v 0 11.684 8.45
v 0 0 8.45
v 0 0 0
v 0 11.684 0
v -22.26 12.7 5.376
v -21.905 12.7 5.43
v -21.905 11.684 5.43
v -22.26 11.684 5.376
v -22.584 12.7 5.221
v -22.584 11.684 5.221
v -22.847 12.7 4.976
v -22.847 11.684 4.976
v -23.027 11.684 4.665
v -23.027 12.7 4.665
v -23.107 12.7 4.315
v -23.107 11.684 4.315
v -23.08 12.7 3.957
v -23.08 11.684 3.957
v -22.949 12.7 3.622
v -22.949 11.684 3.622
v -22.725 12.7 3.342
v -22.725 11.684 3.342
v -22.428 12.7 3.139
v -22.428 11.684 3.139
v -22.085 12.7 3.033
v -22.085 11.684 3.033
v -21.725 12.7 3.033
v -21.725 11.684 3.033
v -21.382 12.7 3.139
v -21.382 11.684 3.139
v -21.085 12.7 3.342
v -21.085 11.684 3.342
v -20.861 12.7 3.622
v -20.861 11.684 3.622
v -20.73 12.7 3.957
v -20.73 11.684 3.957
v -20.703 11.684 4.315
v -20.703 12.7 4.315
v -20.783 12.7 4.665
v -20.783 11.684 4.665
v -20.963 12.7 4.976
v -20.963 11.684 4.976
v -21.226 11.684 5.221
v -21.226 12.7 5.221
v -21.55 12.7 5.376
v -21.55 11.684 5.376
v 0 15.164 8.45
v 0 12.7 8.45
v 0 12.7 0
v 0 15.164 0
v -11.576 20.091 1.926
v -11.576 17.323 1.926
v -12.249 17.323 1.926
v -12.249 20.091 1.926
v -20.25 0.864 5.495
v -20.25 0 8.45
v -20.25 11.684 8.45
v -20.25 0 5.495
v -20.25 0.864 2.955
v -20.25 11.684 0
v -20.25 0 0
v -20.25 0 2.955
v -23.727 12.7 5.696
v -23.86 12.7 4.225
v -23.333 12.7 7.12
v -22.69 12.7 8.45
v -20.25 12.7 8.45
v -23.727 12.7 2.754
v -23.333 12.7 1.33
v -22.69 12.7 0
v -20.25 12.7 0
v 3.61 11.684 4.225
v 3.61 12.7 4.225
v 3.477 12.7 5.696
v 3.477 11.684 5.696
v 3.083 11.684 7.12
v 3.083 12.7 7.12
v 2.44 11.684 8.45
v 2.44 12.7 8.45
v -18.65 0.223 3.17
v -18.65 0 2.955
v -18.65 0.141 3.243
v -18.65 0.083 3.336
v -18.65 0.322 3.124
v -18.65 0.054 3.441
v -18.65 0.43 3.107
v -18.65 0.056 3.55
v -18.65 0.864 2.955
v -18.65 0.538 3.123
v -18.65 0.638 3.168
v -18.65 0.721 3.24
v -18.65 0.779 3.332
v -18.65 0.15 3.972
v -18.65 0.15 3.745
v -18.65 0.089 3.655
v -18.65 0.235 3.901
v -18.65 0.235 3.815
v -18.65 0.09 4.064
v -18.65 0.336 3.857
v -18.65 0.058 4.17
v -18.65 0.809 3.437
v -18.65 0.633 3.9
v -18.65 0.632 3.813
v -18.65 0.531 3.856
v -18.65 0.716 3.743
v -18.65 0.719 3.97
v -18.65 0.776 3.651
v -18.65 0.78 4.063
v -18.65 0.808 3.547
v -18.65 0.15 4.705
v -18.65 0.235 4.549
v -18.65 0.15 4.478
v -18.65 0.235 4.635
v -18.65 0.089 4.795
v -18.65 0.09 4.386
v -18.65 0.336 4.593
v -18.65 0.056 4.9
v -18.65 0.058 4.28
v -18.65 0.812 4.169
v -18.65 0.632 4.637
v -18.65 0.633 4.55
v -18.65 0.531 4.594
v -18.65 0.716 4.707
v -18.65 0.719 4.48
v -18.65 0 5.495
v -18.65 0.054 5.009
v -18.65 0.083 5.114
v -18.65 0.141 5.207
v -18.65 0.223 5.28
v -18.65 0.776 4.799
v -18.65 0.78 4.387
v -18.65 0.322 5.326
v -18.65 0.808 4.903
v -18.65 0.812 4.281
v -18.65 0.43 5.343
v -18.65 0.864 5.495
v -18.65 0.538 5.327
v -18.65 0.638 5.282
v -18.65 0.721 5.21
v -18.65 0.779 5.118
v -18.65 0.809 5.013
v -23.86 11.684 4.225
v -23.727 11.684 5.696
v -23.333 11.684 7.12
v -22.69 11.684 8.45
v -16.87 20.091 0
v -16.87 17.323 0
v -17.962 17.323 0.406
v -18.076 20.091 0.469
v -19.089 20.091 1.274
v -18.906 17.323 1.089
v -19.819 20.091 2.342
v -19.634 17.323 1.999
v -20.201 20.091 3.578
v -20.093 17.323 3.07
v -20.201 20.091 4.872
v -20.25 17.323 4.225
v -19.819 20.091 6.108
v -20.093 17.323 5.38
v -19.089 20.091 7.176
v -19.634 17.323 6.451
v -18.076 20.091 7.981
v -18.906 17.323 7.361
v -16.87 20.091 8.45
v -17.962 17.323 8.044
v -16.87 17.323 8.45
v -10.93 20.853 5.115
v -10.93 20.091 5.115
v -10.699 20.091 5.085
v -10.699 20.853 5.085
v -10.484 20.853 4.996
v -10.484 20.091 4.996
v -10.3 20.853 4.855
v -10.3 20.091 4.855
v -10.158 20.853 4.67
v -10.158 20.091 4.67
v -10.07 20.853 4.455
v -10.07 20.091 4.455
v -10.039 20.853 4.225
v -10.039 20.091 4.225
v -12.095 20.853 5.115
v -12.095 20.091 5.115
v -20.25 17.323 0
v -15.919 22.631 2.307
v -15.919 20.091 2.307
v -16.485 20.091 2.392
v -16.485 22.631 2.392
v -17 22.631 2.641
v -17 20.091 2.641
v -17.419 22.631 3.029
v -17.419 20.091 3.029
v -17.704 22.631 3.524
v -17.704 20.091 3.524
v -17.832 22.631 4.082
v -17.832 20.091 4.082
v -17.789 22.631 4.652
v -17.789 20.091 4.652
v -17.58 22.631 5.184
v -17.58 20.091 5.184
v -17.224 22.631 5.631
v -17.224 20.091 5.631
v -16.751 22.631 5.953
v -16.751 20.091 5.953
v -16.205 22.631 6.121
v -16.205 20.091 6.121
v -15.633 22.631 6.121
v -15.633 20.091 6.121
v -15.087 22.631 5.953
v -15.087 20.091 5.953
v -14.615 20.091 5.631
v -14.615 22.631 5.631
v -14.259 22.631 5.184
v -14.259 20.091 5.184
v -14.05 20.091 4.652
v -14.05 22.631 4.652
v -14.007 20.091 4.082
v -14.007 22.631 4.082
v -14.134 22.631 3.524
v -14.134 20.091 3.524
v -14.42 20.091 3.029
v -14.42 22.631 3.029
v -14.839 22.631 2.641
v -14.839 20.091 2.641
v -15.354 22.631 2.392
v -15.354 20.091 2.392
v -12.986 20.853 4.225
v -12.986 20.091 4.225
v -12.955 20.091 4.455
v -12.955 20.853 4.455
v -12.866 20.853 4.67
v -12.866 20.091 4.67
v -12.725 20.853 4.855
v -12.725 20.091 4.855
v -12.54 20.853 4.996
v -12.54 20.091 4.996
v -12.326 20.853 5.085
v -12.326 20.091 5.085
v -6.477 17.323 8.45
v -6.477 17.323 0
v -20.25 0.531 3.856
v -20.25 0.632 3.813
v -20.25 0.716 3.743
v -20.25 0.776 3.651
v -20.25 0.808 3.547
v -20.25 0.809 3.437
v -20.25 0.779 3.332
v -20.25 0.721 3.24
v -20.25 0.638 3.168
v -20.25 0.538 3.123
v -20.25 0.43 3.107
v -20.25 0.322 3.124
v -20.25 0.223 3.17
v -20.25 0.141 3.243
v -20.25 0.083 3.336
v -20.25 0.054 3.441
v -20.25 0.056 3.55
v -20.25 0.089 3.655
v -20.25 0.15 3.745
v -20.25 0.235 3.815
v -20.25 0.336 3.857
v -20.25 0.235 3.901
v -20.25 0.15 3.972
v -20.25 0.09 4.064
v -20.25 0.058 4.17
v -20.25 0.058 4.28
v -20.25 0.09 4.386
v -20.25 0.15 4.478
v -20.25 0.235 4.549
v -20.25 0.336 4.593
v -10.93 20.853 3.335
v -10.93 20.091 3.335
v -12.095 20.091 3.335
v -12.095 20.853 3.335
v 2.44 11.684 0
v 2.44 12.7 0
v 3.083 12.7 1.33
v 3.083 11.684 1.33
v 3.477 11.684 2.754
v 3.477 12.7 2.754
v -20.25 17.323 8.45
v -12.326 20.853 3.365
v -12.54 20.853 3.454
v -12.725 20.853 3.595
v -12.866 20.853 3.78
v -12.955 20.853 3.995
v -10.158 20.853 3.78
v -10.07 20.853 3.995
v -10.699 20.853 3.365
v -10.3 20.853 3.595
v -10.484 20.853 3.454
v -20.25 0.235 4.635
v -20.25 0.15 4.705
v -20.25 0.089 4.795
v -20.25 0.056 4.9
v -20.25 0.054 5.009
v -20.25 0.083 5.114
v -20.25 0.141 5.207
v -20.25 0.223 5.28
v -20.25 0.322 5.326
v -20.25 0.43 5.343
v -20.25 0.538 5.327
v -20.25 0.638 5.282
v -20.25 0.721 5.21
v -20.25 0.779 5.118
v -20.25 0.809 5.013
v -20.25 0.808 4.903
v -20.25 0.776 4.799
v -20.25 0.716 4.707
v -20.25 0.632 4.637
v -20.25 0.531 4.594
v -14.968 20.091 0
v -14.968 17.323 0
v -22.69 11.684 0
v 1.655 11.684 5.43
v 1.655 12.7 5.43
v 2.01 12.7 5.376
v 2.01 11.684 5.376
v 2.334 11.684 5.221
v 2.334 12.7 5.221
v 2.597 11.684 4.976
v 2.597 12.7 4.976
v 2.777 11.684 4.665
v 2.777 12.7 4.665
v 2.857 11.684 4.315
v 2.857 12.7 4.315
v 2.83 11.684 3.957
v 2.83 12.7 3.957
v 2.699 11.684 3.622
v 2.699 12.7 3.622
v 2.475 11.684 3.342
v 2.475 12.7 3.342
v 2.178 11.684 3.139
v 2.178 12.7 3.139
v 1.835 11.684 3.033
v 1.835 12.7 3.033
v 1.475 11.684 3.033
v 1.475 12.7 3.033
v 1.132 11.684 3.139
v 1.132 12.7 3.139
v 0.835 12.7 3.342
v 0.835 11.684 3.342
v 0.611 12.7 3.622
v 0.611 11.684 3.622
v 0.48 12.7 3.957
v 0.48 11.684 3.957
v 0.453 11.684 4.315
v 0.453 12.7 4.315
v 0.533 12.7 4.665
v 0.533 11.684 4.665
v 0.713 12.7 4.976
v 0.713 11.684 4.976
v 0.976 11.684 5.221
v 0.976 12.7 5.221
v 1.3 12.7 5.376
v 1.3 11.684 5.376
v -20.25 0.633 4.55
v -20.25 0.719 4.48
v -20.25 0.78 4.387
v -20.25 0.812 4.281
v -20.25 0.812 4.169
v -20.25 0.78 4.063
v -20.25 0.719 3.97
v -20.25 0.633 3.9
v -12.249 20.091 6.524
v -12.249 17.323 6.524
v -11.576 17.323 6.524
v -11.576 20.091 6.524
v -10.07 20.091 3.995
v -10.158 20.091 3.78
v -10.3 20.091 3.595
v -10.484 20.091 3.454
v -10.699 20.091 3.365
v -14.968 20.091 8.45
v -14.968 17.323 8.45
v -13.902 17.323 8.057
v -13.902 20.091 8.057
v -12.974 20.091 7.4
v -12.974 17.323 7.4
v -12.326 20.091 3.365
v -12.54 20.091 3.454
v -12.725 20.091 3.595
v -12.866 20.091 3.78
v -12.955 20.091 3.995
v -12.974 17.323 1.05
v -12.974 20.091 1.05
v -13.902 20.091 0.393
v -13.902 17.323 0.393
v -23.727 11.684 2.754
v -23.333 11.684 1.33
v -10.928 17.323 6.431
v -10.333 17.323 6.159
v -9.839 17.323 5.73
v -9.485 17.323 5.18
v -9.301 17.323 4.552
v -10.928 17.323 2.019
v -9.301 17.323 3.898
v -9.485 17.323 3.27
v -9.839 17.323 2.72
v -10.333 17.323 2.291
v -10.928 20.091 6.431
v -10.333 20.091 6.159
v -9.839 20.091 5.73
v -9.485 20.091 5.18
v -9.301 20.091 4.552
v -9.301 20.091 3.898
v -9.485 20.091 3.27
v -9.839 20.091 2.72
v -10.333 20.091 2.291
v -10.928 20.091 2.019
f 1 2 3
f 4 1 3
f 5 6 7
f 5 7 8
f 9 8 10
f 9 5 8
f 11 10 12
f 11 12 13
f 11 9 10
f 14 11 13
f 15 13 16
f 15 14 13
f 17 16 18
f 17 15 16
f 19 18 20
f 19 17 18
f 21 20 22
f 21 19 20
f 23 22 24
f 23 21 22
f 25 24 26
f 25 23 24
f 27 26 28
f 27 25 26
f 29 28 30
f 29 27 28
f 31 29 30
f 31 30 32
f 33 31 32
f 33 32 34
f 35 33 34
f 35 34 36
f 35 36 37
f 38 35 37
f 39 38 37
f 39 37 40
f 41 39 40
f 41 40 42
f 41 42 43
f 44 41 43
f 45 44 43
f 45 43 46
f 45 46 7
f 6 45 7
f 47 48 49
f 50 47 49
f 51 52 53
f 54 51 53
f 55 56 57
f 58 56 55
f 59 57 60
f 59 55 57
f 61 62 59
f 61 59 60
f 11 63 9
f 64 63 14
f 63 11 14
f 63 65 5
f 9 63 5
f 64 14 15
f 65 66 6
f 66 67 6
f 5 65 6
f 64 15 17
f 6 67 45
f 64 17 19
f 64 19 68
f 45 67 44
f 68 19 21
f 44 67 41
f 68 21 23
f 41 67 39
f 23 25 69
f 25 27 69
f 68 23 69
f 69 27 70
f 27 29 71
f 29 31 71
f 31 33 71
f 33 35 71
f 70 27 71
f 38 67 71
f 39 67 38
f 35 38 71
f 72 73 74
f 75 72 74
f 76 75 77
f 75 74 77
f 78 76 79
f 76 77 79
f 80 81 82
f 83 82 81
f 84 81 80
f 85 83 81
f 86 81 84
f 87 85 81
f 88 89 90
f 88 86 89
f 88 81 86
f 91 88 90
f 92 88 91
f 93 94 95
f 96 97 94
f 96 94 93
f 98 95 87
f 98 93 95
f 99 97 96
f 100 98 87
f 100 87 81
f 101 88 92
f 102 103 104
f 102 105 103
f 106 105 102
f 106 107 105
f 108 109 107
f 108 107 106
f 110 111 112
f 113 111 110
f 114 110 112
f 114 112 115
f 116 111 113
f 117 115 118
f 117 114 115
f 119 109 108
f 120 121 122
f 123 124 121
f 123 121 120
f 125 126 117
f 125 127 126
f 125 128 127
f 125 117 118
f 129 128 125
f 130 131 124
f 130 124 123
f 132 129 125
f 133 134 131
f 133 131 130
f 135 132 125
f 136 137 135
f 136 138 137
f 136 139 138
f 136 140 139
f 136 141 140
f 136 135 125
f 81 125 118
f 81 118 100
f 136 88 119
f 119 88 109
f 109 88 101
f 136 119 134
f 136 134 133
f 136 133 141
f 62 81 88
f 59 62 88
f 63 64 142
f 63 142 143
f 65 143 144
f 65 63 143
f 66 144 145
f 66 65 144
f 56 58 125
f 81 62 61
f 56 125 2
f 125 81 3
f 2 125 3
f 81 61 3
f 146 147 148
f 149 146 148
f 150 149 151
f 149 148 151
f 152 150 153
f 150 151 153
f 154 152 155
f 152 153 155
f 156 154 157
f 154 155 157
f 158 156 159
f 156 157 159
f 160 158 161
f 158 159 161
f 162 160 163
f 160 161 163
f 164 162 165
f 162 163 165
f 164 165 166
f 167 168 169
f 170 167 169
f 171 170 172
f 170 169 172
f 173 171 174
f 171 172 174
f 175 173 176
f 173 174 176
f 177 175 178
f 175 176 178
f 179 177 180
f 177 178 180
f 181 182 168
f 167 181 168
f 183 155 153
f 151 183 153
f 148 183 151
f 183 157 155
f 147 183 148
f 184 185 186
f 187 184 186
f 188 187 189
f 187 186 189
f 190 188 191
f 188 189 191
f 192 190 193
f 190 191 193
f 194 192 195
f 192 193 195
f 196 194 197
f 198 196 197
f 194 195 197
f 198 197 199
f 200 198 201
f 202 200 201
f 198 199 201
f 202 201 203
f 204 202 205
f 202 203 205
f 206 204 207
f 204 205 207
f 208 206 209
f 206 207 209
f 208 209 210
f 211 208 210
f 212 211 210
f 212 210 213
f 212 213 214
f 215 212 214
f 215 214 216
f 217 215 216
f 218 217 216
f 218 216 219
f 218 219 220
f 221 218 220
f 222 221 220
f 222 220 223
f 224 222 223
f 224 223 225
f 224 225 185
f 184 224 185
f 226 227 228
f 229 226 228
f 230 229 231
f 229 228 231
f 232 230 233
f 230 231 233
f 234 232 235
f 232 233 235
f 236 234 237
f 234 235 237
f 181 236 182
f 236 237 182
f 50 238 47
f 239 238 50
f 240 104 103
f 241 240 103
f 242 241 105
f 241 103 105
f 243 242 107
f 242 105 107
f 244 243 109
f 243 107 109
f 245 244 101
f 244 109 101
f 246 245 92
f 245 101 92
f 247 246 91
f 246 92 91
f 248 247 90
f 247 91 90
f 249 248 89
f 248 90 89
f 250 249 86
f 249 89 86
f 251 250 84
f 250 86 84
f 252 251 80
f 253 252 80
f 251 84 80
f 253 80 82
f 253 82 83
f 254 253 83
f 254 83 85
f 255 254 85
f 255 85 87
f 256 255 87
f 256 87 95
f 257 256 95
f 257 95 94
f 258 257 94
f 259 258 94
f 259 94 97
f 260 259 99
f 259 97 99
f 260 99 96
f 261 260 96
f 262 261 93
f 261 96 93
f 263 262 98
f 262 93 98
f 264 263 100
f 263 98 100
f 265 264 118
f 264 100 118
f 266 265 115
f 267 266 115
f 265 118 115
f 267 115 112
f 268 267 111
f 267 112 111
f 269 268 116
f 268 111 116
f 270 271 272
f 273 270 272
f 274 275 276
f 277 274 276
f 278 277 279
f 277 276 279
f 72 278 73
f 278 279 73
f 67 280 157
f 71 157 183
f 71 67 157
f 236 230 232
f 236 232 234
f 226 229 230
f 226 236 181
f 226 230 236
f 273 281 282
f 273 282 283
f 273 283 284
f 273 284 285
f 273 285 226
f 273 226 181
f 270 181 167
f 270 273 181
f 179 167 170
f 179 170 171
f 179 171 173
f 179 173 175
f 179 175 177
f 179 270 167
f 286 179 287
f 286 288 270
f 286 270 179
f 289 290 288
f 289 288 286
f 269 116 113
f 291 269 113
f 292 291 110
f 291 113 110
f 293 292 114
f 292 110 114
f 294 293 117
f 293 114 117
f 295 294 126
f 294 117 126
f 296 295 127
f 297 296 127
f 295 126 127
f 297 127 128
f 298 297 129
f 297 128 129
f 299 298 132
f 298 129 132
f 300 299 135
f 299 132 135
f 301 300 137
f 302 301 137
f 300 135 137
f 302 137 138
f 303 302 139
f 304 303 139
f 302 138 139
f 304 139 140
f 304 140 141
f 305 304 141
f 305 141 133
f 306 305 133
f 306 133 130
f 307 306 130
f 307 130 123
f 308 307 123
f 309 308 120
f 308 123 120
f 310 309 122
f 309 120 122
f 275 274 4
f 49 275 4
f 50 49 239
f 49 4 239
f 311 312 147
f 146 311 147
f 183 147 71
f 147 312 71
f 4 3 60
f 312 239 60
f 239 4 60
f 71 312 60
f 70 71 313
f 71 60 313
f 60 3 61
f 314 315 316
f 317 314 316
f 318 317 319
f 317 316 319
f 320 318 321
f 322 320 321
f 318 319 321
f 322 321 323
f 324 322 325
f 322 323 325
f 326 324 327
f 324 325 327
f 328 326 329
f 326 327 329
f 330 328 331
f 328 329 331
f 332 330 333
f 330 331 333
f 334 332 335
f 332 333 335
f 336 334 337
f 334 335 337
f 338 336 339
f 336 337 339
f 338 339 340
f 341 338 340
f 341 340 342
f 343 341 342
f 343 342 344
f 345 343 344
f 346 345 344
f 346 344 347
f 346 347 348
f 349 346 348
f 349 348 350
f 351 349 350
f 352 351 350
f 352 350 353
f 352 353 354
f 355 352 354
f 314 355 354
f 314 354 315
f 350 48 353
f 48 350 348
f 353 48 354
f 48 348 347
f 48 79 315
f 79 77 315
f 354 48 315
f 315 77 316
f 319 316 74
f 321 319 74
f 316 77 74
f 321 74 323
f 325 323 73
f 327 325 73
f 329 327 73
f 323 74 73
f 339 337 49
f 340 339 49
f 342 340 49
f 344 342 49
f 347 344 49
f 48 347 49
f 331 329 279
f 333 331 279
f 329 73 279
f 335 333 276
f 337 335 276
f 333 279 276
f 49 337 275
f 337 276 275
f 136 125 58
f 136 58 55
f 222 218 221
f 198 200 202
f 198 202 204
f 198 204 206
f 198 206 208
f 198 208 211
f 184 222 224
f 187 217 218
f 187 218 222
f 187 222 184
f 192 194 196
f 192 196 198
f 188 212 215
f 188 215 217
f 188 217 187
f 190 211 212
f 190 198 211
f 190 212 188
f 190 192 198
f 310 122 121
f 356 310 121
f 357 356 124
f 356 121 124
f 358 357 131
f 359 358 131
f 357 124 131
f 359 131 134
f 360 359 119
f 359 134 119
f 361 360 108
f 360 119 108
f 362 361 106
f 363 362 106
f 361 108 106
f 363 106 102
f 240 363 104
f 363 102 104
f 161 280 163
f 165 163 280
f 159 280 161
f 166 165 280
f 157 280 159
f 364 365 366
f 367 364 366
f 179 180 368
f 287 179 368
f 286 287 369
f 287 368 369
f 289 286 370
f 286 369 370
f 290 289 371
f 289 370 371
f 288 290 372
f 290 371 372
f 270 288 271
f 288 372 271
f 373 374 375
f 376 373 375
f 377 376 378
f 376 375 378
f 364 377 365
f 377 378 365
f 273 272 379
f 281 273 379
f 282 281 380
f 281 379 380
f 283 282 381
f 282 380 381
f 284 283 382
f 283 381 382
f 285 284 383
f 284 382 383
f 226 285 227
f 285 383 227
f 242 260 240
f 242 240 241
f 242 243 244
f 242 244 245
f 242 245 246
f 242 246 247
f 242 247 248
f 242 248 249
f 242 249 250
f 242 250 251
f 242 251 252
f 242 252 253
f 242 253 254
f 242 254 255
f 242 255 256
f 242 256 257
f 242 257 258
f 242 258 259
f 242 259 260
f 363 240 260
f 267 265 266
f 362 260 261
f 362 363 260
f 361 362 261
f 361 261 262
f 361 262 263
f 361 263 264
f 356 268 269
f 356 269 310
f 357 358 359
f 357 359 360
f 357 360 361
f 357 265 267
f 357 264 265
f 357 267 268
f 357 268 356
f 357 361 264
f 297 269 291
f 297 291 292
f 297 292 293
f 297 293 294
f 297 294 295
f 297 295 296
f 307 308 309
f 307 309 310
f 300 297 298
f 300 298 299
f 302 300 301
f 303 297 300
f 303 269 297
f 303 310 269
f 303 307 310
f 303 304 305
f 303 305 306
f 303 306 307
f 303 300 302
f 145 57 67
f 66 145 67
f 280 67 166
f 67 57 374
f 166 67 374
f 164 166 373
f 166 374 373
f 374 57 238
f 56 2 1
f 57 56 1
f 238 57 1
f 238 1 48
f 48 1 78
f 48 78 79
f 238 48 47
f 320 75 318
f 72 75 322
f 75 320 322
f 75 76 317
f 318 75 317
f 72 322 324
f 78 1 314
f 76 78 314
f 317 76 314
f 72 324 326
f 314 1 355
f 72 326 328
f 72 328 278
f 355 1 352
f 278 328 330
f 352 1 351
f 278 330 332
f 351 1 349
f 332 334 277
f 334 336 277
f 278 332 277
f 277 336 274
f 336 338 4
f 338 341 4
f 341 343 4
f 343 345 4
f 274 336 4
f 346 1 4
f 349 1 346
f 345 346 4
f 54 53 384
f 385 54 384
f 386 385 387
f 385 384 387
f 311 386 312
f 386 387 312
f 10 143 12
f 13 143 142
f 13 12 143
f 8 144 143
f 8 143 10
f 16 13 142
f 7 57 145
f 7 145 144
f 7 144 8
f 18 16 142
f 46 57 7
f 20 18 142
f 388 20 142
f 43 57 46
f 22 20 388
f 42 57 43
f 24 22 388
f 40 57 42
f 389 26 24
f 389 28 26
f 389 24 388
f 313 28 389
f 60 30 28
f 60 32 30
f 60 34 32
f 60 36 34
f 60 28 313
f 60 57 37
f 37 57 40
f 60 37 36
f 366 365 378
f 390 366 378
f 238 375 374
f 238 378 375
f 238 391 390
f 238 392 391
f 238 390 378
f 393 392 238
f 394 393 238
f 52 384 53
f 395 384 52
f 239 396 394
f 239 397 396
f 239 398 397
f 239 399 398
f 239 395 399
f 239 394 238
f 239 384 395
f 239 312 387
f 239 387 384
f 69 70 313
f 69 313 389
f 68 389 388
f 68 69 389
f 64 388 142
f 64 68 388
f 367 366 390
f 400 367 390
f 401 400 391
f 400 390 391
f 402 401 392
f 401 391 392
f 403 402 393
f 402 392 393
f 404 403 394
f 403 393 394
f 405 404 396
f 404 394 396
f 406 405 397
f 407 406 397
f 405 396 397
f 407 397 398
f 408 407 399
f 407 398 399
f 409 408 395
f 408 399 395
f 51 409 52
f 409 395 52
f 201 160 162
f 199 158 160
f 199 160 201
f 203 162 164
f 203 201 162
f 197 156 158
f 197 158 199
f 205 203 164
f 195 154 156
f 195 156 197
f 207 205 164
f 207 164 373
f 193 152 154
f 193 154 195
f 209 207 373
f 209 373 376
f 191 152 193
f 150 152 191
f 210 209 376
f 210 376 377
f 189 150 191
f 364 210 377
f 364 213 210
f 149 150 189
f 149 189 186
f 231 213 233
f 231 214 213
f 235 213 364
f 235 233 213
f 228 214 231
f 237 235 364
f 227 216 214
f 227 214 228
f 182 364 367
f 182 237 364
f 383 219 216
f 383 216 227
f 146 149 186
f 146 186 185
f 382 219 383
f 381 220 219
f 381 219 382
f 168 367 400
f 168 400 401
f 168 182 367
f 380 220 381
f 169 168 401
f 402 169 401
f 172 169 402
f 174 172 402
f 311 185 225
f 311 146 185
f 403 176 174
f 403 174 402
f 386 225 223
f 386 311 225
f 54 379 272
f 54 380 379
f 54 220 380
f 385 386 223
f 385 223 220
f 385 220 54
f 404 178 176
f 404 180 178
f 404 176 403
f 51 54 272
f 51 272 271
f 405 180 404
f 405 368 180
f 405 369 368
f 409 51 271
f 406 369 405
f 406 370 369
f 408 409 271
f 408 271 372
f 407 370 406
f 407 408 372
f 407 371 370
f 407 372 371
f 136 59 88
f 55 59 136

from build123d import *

# Parameters (mm, degrees)
SKETCH1_W           = 20.25
SKETCH1_H           = 8.45
BOSS_EXTRUDE1_DEPTH = 12.7
SKETCH2_W           = 8.45
SKETCH2_H           = 1.016
BOSS_EXTRUDE2_DEPTH = 3.61
CUT_EXTRUDE1_REACH  = 27.353
SKETCH3_R           = 1.205
SKETCH4_W           = 20.25
SKETCH4_H           = 8.45
BOSS_EXTRUDE3_DEPTH = 4.6228
CHAMFER1_SIZE       = 2.159
CHAMFER1_SIZE2      = 6.477
SKETCH5_R           = 1.9177
BOSS_EXTRUDE4_DEPTH = 5.3086
SKETCH6_R           = 1.9177
BOSS_EXTRUDE5_DEPTH = 2.7686
BOSS_EXTRUDE6_DEPTH = 0.762
SKETCH8_W           = 2.54
SKETCH8_H           = 0.8636
CUT_EXTRUDE2_DEPTH  = 1.6002
SKETCH9_R           = 0.381
BOSS_EXTRUDE9_DEPTH = 1.6002


with BuildPart() as part:
    # Sketch1 → Boss-Extrude1 (new body)
    with BuildSketch(Plane(origin=(0, 0, 0), x_dir=(1, 0, 0), z_dir=(0, 1, 0))):
        with Locations((-10.125, -4.225)):
            Rectangle(SKETCH1_W, SKETCH1_H)
    extrude(amount=BOSS_EXTRUDE1_DEPTH)

    # Sketch2 → Boss-Extrude2 (add)
    with BuildSketch(Plane(origin=(0, 0, 0), x_dir=(0, 0, -1), z_dir=(1, 0, 0))):
        with Locations((-4.225, 12.192)):
            Rectangle(SKETCH2_W, SKETCH2_H)
    boss_extrude2 = extrude(amount=BOSS_EXTRUDE2_DEPTH)

    # Sketch3 → Cut-Extrude1 (cut, up to next)
    with BuildSketch(Plane(origin=(0, 12.7, 0), x_dir=(1, 0, 0), z_dir=(0, 1, 0)), mode=Mode.PRIVATE) as cut_extrude1_sk1:
        with BuildLine():
            ThreePointArc((3.61, -4.225), (3.312097542, -6.417003935), (2.44, -8.45))
            Line((2.44, -8.45), (3.61, -8.45))
            Line((3.61, -8.45), (3.61, -4.225))
        make_face()
    cut_extrude1_tool1 = extrude(cut_extrude1_sk1.sketch, amount=-CUT_EXTRUDE1_REACH, mode=Mode.PRIVATE) & part.part
    # Sketch3 → Cut-Extrude1 (cut, up to next)
    with BuildSketch(Plane(origin=(0, 12.7, 0), x_dir=(1, 0, 0), z_dir=(0, 1, 0)), mode=Mode.PRIVATE) as cut_extrude1_sk2:
        with BuildLine():
            ThreePointArc((2.44, 0), (3.312097542, -2.032996065), (3.61, -4.225))
            Line((3.61, -4.225), (3.61, 0))
            Line((3.61, 0), (2.44, 0))
        make_face()
    cut_extrude1_tool2 = extrude(cut_extrude1_sk2.sketch, amount=-CUT_EXTRUDE1_REACH, mode=Mode.PRIVATE) & part.part
    # Sketch3 → Cut-Extrude1 (cut, up to next)
    with BuildSketch(Plane(origin=(0, 12.7, 0), x_dir=(1, 0, 0), z_dir=(0, 1, 0)), mode=Mode.PRIVATE) as cut_extrude1_sk3:
        with Locations(Location((1.655, -4.225, 0), (0, 0, 270))):
            Circle(SKETCH3_R)
    cut_extrude1_tool3 = extrude(cut_extrude1_sk3.sketch, amount=-CUT_EXTRUDE1_REACH, mode=Mode.PRIVATE) & part.part
    cut_extrude1_1 = cut_extrude1_tool1.solids().sort_by_distance((3.263745, 12.7, 7.409386))[0]
    add(cut_extrude1_1, mode=Mode.SUBTRACT)
    cut_extrude1_2 = cut_extrude1_tool2.solids().sort_by_distance((3.263745, 12.7, 1.040614))[0]
    add(cut_extrude1_2, mode=Mode.SUBTRACT)
    cut_extrude1_3 = cut_extrude1_tool3.solids().sort_by_distance((1.655, 12.7, 4.225))[0]
    add(cut_extrude1_3, mode=Mode.SUBTRACT)
    cut_extrude1 = cut_extrude1_1 + cut_extrude1_2 + cut_extrude1_3  # Cut-Extrude1 as one shape, for the pattern or mirror that repeats it

    # Mirror1: Boss-Extrude2, Cut-Extrude1 across plane
    add(boss_extrude2.mirror(Plane(origin=(-10.125, 0, 0), x_dir=(0, 0, 1), z_dir=(1, 0, 0))))
    add(cut_extrude1.mirror(Plane(origin=(-10.125, 0, 0), x_dir=(0, 0, 1), z_dir=(1, 0, 0))), mode=Mode.SUBTRACT)

    # Sketch4 → Boss-Extrude3 (add)
    with BuildSketch(Plane(origin=(0, 12.7, 0), x_dir=(1, 0, 0), z_dir=(0, 1, 0))):
        with Locations((-10.125, -4.225)):
            Rectangle(SKETCH4_W, SKETCH4_H)
    extrude(amount=BOSS_EXTRUDE3_DEPTH)

    # Chamfer1
    chamfer1_edges = [part.edges().sort_by_distance(p)[0] for p in [
        (0, 17.3228, 4.225),
    ]]
    chamfer1_side = [part.faces().sort_by_distance(p)[0] for p in [
        (0, 15.0114, 4.225),
    ]]
    chamfer(chamfer1_edges, length=CHAMFER1_SIZE, length2=CHAMFER1_SIZE2, reference=chamfer1_side[0])

    # Sketch5 → Boss-Extrude4 (add)
    with BuildSketch(Plane(origin=(0, 17.3228, 0), x_dir=(1, 0, 0), z_dir=(0, 1, 0))):
        with Locations(Location((-15.9193, -4.225, 0), (0, 0, 90))):
            Circle(SKETCH5_R)
    extrude(amount=BOSS_EXTRUDE4_DEPTH)

    # Sketch6 → Boss-Extrude5 (add)
    # profile 1 of 2: a face of its own
    with BuildSketch(Plane(origin=(0, 17.3228, 0), x_dir=(1, 0, 0), z_dir=(0, 1, 0))):
        with BuildLine():
            Line((-11.5759, -1.9263), (-12.249021972, -1.9263))
            ThreePointArc((-12.249021972, -1.9263), (-11.5886, -4.225), (-12.249021972, -6.5237))
            Line((-12.249021972, -6.5237), (-11.5759, -6.5237))
            ThreePointArc((-11.5759, -6.5237), (-9.2772, -4.225), (-11.5759, -1.9263))
        make_face()
    # profile 2 of 2: a face of its own
    with BuildSketch(Plane(origin=(0, 17.3228, 0), x_dir=(1, 0, 0), z_dir=(0, 1, 0))):
        with BuildLine():
            Line((-14.968333392, 0), (-16.870266608, 0))
            ThreePointArc((-16.870266608, 0), (-20.25, -4.225), (-16.870266608, -8.45))
            Line((-16.870266608, -8.45), (-14.968333392, -8.45))
            ThreePointArc((-14.968333392, -8.45), (-13.415975527, -7.758883002), (-12.249021972, -6.5237))
            ThreePointArc((-12.249021972, -6.5237), (-11.5886, -4.225), (-12.249021972, -1.9263))
            ThreePointArc((-12.249021972, -1.9263), (-13.415975527, -0.691116998), (-14.968333392, 0))
        make_face()
        with Locations(Location((-15.9193, -4.225, 0), (0, 0, 270))):
            Circle(SKETCH6_R, mode=Mode.SUBTRACT)
    extrude(amount=BOSS_EXTRUDE5_DEPTH)

    # Sketch7 → Boss-Extrude6 (add)
    with BuildSketch(Plane(origin=(0, 20.0914, 0), x_dir=(1, 0, 0), z_dir=(0, 1, 0))):
        with BuildLine():
            Line((-10.0392, -4.225), (-12.9856, -4.225))
            ThreePointArc((-12.9856, -4.225), (-12.724790977, -4.854648681), (-12.095142296, -5.115457704))
            Line((-12.095142296, -5.115457704), (-10.929657704, -5.115457704))
            ThreePointArc((-10.929657704, -5.115457704), (-10.300009023, -4.854648681), (-10.0392, -4.225))
        make_face()
        with BuildLine():
            ThreePointArc((-12.095142296, -3.334542296), (-12.724790977, -3.595351319), (-12.9856, -4.225))
            Line((-12.9856, -4.225), (-10.0392, -4.225))
            ThreePointArc((-10.0392, -4.225), (-10.300009023, -3.595351319), (-10.929657704, -3.334542296))
            Line((-10.929657704, -3.334542296), (-12.095142296, -3.334542296))
        make_face()
    extrude(amount=BOSS_EXTRUDE6_DEPTH)

    # Sketch8 → Cut-Extrude2 (cut)
    with BuildSketch(Plane.ZY.offset(20.25)):
        with Locations((4.225, 0.4318)):
            Rectangle(SKETCH8_W, SKETCH8_H)
    extrude(amount=-CUT_EXTRUDE2_DEPTH, mode=Mode.SUBTRACT)

    # Sketch9 → Boss-Extrude9 (add)
    with BuildSketch(Plane.ZY.offset(18.6498)):
        with Locations((4.961591366, 0.4318)):
            Circle(SKETCH9_R)
        with Locations((4.225, 0.435366491)):
            Circle(SKETCH9_R)
        with Locations((3.488408634, 0.4318)):
            Circle(SKETCH9_R)
    extrude(amount=BOSS_EXTRUDE9_DEPTH)


solid = part.part
